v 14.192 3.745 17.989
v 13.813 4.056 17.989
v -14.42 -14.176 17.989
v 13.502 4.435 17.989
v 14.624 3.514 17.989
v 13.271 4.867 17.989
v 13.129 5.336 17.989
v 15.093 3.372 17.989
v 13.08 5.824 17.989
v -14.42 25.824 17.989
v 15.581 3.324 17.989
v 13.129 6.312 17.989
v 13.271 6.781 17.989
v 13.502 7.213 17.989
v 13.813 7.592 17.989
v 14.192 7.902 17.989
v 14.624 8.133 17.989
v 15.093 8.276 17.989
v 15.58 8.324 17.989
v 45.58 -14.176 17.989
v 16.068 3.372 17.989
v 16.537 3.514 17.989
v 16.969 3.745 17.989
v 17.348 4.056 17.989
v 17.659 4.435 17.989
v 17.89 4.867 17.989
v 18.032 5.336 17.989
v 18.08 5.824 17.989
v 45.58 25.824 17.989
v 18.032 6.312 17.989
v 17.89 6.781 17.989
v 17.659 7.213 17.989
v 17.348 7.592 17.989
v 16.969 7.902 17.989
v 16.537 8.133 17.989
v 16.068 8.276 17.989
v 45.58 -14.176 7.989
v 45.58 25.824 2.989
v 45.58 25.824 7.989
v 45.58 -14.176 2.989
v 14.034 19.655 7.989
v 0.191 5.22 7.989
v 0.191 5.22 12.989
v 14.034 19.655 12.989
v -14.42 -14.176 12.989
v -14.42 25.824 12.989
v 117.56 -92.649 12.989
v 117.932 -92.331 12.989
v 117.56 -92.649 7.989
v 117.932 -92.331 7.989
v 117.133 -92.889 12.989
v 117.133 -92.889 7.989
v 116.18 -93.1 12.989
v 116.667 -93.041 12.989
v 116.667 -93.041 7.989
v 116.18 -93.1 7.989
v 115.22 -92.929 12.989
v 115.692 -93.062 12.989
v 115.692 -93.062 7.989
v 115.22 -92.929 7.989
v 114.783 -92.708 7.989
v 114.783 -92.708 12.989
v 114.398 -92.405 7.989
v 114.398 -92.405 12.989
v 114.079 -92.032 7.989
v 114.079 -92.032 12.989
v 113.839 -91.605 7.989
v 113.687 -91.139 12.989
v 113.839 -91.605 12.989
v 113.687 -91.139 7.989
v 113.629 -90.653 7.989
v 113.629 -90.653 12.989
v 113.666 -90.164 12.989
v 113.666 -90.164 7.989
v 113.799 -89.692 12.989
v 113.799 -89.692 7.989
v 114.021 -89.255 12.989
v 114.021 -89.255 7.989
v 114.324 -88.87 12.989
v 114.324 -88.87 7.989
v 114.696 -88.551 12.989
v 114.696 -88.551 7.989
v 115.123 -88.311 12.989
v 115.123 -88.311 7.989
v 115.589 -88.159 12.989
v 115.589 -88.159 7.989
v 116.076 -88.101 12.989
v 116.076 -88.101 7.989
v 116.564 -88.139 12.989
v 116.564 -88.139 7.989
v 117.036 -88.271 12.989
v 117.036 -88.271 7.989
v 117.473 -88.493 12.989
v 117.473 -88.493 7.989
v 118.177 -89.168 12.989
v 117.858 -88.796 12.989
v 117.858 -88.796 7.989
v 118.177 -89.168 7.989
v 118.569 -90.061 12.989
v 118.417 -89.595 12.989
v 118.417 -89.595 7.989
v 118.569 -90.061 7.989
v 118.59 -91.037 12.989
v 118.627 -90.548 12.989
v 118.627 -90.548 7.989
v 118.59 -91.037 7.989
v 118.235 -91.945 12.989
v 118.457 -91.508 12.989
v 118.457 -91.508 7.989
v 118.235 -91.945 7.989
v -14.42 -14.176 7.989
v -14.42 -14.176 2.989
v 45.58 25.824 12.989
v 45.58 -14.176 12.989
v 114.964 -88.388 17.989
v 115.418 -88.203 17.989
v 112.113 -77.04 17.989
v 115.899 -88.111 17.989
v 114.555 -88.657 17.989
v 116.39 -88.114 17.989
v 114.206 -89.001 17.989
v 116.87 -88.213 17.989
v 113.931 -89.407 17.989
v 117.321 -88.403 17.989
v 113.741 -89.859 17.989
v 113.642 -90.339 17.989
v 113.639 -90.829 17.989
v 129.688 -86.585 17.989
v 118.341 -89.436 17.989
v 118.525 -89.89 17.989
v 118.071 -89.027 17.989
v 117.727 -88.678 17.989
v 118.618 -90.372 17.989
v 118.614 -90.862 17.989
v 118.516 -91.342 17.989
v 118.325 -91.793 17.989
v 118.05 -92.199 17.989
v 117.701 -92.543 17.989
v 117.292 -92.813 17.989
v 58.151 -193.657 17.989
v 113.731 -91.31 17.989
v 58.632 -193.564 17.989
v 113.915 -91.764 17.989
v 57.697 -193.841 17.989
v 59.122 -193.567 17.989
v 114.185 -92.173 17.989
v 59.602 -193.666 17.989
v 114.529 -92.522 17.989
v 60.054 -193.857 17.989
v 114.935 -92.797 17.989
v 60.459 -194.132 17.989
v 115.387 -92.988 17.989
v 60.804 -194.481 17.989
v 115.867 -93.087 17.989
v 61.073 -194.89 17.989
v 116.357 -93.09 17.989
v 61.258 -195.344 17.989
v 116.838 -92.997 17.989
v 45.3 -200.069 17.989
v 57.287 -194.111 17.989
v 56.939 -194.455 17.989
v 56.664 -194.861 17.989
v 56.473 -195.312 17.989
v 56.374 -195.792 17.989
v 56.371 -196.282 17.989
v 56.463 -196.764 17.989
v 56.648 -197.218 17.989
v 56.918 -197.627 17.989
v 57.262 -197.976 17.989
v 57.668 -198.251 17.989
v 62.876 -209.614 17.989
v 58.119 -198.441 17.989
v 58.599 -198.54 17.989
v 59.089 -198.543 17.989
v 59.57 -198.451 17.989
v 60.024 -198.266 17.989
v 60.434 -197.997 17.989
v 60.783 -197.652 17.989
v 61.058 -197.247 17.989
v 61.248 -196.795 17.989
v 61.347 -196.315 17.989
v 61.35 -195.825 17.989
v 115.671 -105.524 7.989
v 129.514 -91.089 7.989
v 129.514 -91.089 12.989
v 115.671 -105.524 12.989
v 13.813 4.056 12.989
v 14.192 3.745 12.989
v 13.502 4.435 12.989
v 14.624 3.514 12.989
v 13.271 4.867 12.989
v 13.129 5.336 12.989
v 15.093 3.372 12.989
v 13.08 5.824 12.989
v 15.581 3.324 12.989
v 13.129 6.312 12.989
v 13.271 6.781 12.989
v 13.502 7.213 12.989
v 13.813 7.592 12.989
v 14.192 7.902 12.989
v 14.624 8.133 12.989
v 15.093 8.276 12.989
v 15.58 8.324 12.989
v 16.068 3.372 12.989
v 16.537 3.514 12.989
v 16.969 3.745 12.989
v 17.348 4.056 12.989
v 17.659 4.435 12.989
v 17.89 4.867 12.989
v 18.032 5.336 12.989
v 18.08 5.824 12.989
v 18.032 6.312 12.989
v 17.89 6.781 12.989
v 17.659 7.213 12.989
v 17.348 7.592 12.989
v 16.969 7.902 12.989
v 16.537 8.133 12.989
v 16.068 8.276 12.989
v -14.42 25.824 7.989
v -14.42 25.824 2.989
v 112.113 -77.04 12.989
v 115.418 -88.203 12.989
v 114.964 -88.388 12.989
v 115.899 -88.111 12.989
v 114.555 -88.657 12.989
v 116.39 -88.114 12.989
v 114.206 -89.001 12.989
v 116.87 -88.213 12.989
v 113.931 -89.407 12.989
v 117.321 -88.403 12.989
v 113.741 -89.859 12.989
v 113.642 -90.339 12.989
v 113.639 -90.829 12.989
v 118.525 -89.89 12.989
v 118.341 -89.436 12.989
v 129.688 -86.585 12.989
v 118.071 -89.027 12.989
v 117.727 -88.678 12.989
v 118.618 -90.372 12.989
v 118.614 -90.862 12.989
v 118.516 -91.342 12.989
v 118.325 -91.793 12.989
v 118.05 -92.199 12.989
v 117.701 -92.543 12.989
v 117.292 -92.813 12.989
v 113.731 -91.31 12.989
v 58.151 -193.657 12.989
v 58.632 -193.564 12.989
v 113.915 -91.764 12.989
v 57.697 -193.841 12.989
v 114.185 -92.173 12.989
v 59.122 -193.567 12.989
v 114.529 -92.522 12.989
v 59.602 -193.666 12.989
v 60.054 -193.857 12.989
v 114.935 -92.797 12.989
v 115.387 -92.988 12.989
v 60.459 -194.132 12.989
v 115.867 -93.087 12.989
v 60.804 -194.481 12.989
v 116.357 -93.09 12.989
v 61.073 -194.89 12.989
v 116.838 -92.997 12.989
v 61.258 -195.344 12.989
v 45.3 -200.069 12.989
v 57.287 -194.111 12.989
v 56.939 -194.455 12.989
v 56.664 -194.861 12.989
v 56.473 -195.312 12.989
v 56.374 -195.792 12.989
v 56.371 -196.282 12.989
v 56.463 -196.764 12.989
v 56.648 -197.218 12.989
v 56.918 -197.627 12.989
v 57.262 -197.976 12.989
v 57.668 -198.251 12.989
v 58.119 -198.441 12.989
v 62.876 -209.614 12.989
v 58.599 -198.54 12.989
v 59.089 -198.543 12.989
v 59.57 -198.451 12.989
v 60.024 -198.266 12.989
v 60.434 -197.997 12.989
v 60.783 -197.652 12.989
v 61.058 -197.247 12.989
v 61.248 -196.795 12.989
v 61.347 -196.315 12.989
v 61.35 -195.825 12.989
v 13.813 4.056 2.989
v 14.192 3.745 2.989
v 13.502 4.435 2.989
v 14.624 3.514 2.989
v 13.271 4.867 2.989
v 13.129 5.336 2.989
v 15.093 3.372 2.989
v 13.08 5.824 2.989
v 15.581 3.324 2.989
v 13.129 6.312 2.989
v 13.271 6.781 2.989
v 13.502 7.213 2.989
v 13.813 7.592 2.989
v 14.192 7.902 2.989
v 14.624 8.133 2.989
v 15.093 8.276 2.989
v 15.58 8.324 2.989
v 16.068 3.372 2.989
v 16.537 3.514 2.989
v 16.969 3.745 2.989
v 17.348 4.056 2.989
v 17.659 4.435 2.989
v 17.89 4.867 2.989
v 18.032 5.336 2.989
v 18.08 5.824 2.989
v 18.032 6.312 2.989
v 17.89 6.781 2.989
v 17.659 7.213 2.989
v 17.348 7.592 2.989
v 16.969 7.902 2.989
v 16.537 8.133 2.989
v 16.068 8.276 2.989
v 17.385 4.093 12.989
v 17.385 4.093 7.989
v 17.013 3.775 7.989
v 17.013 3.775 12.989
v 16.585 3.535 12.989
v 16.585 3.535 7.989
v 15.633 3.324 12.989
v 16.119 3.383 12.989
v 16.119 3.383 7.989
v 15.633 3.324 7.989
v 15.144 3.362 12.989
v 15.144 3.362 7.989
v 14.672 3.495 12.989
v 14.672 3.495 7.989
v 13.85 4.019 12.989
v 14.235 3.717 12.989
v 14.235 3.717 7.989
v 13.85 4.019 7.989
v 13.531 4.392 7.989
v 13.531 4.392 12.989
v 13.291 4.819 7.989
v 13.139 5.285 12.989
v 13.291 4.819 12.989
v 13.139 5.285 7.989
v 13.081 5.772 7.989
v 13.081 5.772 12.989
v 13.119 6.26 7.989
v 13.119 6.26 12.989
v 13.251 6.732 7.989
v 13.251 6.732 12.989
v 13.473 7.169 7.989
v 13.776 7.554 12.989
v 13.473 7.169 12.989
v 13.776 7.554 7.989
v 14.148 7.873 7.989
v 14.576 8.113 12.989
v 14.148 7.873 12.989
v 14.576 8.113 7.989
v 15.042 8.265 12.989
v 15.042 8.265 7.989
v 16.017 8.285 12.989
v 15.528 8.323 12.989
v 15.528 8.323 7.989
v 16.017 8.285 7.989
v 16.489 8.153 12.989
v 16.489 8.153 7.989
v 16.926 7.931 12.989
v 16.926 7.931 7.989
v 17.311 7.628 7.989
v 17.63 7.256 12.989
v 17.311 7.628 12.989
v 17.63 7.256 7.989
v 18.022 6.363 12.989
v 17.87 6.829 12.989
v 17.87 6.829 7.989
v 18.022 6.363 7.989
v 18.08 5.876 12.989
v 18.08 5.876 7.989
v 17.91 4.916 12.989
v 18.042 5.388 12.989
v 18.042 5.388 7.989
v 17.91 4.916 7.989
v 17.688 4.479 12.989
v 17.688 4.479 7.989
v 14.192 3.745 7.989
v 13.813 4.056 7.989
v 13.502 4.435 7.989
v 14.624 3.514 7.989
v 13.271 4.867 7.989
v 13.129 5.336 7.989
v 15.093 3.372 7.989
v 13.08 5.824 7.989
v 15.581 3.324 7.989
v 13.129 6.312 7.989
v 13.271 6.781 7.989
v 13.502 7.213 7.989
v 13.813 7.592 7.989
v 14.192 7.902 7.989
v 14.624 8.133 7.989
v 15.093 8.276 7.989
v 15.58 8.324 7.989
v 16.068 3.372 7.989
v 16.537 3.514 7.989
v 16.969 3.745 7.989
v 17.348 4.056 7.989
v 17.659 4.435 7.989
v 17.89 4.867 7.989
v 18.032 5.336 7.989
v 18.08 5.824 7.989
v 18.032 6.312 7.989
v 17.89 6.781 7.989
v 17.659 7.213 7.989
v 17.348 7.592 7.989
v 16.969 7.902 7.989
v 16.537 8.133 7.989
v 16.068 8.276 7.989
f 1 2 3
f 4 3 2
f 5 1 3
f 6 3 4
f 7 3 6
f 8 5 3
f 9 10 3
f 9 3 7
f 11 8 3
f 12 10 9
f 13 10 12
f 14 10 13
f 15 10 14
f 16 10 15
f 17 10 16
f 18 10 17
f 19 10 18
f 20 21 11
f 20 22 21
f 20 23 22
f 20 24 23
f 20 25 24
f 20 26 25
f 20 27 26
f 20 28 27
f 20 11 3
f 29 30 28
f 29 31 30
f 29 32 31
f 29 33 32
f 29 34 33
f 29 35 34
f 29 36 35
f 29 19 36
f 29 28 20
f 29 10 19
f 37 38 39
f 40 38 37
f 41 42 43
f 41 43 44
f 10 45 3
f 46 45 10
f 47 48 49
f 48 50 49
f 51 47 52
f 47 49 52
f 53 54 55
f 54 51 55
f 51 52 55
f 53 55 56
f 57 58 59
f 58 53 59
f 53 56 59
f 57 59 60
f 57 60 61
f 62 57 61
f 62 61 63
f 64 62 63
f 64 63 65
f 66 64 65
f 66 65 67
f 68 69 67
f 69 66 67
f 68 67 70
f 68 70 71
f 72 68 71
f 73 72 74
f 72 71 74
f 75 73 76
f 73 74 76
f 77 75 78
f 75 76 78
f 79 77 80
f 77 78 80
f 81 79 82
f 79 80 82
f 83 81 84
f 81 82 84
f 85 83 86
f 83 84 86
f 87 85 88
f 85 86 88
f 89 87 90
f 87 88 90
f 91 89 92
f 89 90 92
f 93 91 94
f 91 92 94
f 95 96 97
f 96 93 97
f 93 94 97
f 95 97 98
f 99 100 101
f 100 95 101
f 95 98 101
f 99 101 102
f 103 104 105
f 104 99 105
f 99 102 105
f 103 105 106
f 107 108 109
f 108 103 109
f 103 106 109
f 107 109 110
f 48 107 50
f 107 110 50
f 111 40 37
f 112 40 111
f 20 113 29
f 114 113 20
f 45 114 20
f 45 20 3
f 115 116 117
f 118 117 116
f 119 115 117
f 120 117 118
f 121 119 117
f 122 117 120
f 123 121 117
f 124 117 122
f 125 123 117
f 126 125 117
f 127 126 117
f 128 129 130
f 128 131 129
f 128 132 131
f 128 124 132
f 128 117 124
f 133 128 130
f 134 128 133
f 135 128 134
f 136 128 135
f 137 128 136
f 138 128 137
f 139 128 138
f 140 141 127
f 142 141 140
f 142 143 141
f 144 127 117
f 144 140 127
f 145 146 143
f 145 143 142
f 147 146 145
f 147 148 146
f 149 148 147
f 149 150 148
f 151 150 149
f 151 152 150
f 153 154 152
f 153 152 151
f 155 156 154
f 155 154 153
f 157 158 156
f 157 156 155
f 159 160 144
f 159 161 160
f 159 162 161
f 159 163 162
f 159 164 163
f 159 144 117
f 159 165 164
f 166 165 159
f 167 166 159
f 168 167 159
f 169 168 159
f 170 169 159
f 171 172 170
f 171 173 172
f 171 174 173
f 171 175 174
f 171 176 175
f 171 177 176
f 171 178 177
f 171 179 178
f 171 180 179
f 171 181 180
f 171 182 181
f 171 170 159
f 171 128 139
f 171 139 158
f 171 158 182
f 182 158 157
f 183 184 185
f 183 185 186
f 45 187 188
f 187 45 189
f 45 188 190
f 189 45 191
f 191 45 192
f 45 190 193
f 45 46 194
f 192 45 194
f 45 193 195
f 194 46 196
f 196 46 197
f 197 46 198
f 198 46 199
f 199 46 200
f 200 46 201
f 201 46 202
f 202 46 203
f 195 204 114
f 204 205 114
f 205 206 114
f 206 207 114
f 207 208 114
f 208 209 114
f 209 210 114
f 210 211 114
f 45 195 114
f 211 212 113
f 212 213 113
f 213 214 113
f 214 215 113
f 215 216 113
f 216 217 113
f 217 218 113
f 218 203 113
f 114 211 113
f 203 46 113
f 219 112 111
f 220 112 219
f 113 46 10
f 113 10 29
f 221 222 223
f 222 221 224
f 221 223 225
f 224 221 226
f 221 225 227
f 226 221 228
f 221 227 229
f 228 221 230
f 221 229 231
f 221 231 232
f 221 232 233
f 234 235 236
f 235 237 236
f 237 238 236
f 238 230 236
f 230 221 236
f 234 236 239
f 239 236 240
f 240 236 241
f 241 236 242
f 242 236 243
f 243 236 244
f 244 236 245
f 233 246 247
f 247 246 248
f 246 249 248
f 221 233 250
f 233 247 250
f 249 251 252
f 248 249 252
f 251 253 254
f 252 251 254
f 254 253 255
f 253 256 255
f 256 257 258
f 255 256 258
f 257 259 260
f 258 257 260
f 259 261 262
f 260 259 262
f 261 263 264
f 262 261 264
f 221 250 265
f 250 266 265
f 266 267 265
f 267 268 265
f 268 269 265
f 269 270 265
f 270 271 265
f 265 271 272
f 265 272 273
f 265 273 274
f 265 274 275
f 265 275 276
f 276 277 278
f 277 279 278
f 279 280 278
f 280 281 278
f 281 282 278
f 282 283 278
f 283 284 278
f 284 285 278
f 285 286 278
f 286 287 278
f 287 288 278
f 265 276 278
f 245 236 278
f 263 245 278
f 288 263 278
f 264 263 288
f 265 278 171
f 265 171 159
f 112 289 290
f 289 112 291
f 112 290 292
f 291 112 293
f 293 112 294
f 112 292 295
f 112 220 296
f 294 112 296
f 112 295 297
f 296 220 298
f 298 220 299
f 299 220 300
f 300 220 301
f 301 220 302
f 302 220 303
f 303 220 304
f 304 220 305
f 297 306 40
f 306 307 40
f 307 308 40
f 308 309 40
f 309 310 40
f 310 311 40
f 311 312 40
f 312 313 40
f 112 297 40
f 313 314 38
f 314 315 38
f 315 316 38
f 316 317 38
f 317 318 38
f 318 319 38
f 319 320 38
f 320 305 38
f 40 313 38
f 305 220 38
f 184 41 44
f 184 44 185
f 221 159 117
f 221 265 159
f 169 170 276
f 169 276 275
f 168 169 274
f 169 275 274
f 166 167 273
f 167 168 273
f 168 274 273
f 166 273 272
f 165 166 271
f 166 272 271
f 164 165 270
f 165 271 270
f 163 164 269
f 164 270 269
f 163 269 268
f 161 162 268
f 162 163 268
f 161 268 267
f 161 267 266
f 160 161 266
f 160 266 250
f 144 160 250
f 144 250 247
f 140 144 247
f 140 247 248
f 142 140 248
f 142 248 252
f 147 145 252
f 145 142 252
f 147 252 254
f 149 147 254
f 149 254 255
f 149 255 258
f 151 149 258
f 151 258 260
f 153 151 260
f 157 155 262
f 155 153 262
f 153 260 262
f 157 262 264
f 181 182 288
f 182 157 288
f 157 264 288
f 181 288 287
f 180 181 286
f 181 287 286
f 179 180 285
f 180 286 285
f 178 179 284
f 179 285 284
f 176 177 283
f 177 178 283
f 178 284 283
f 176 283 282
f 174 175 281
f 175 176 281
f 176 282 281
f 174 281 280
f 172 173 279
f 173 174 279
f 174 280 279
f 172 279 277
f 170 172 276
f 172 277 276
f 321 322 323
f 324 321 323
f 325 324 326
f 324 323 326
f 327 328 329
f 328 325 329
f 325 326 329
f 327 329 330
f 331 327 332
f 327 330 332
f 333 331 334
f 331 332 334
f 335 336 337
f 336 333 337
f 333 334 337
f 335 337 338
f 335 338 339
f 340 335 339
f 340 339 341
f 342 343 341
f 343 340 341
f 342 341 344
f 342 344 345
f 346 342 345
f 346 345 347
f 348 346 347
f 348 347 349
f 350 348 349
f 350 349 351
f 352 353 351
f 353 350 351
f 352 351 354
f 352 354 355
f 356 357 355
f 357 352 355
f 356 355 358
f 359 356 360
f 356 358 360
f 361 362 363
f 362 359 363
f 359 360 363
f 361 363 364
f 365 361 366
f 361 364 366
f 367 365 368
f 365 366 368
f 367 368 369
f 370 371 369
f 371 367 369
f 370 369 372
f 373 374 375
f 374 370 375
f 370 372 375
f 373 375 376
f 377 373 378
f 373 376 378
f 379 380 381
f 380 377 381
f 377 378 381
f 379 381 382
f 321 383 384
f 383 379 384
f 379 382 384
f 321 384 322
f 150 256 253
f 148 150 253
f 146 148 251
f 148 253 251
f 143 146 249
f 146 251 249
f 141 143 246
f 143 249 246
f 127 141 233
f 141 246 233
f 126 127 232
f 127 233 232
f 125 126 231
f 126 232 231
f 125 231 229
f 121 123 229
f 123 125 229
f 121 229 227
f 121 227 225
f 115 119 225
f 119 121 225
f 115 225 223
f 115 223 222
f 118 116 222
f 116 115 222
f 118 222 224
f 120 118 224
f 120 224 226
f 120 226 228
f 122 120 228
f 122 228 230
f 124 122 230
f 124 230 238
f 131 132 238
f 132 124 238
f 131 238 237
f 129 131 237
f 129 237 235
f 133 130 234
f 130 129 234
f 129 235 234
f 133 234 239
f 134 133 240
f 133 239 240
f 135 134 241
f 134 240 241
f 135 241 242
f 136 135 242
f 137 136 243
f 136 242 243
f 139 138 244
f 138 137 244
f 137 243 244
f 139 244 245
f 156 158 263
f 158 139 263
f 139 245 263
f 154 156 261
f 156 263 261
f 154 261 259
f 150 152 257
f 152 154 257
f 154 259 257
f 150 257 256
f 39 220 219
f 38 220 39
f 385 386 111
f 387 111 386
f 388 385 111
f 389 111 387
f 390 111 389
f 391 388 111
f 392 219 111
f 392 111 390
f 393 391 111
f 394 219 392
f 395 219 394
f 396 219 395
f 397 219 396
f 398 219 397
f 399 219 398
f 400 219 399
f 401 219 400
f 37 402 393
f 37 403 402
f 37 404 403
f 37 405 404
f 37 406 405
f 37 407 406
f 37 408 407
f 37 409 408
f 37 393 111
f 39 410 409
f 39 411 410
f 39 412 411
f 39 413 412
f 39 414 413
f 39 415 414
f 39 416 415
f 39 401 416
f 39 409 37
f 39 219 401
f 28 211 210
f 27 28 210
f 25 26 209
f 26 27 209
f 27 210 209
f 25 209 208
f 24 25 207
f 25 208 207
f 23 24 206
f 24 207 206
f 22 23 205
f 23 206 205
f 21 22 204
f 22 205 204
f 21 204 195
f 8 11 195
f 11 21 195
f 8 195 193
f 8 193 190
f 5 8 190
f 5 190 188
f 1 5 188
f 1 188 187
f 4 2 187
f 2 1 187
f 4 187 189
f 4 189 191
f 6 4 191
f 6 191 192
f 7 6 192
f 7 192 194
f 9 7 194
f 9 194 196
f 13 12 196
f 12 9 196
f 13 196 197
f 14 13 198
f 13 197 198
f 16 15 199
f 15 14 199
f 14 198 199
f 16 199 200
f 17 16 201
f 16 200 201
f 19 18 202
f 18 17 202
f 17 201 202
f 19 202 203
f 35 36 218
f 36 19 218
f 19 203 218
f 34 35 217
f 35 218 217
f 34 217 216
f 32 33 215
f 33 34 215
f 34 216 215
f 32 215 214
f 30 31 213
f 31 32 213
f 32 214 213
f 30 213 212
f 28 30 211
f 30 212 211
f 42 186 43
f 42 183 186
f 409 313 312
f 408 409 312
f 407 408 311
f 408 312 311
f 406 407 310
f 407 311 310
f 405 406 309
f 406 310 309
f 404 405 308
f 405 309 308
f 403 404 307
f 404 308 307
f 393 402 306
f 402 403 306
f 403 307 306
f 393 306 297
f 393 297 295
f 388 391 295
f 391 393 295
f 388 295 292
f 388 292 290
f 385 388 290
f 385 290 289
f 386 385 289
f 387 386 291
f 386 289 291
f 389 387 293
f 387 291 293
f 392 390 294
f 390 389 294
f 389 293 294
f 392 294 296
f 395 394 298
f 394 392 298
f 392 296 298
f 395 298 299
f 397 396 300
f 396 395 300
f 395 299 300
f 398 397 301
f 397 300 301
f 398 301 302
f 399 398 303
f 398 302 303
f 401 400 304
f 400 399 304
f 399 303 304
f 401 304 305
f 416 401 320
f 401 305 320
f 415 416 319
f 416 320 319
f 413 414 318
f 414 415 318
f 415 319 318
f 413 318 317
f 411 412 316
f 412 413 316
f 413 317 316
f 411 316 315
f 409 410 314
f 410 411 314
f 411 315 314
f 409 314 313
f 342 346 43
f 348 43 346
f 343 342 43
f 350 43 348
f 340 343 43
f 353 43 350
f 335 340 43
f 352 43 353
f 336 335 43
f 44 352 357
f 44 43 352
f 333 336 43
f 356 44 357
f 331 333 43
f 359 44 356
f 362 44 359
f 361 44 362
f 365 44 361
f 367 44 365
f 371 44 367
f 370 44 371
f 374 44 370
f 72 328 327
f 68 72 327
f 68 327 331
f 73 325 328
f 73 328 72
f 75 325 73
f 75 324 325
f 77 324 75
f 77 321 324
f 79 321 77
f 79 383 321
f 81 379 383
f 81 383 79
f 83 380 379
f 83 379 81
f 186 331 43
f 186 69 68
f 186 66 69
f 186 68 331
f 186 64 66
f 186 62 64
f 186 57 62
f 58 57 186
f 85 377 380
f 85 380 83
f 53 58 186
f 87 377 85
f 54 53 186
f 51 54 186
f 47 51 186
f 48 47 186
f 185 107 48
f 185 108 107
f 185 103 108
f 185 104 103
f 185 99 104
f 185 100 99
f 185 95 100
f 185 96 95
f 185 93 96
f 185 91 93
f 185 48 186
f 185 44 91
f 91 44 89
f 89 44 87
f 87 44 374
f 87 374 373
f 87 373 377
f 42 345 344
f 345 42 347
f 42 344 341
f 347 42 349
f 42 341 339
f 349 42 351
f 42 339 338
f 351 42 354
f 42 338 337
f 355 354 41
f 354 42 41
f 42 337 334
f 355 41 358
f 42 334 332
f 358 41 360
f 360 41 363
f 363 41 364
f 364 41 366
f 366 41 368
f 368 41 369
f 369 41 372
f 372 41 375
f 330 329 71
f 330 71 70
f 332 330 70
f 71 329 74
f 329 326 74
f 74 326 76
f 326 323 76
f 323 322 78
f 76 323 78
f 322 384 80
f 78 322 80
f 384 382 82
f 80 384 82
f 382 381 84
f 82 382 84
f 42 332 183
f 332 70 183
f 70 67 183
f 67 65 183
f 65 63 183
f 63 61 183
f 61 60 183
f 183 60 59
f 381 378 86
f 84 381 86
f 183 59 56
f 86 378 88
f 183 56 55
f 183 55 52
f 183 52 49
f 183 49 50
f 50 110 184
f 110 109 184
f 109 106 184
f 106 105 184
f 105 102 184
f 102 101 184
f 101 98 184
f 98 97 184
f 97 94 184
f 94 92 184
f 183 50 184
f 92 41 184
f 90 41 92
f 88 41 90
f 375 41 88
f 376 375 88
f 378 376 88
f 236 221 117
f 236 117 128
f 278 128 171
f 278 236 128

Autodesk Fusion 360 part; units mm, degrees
sketch "草图1" plane through (0, 0, 0) normal (0, 0, 1) x (1, 0, 0)
  line L0 (30, 20) -> (-30, 20)
  line L1 (-30, 20) -> (-30, -20)
  line L2 (-30, -20) -> (30, -20)
  line L3 (30, -20) -> (30, 20)
  line L4 (30, 20) -> (-30, -20) construction
  line L5 (-30, 20) -> (30, -20) construction
  circle A0 centre (0, 0) radius 2.5
  dimension "d1" = 5
sketch "草图3" plane through (0, 0, 0) normal (0, 0, 1) x (1, 0, 0)
  line L0 (59.3105, 8.9123) -> (219.3105, 8.9123)
  line L1 (219.3105, 8.9123) -> (219.3105, -11.0877)
  line L2 (219.3105, -11.0877) -> (59.3105, -11.0877)
  line L3 (59.3105, -11.0877) -> (59.3105, 8.9123)
  circle A0 centre (70, 0) radius 2.5
  circle A1 centre (209.3105, 0) radius 2.5
  dimension "d6" = 160
  dimension "d7" = 20
  dimension "d8" = 5
  dimension "d10" = 5
extrude "拉伸3" add sketch "草图3" along normal blind 5 makes body 1
sketch "草图4" plane through (0, 0, 0) normal (0, 0, 1) x (1, 0, 0)
  line L0 (-33, -75) -> (107, -75)
  line L1 (107, -75) -> (107, -95)
  line L2 (107, -95) -> (-33, -95)
  line L3 (-33, -95) -> (-33, -75)
  circle A0 centre (-23, -85) radius 2.5
  circle A1 centre (97, -85) radius 2.5
  dimension "d13" = 140
  dimension "d14" = 20
  dimension "d15" = 5
  dimension "d16" = 5
extrude "拉伸4" add sketch "草图4" along normal blind 5 separate body makes body 2
sketch "草图5" plane through (0, 0, 0) normal (0, 0, 1) x (1, 0, 0)
  line L0 (-30, 20) -> (30, 20)
  line L1 (30, 20) -> (30, -20)
  line L2 (30, -20) -> (-30, -20)
  line L3 (-30, -20) -> (-30, 20)
  line L4 (-30, 20) -> (30, -20) construction
  line L5 (30, 20) -> (-30, -20) construction
  circle A0 centre (0, 0) radius 2.5
  dimension "d19" = 60
  dimension "d20" = 40
  dimension "d21" = 5
extrude "拉伸5" add sketch "草图5" along normal blind 5 separate body makes body 3
sketch "草图6" plane through (0, 0, 0) normal (0, 0, 1) x (1, 0, 0)
  circle A0 centre (76.9556, 57.3858) radius 2.5
  dimension "d24" = 5
copy_body "实体->零部件1" bodies 3 removing the originals makes body 4 in component "Base"
copy_body "实体->零部件2" bodies 1 removing the originals makes body 5 in component "Link 1"
copy_body "实体->零部件3" bodies 2 removing the originals makes body 6 in component "Link 2"
component "Base" placed x (1, 0, 0) y (0, 1, 0) z (0, 0, 1) at (15.5805, 5.8238, 2.9887)
component "Link 1" placed x (0.721751, -0.692152, 0) y (0.692152, 0.721751, 0) z (0, 0, 1) at (-34.9421, 54.2745, 7.9887)
component "Link 2" placed x (-0.477229, -0.878779, 0) y (0.878779, -0.477229, 0) z (0, 0, 1) at (179.848, -151.3766, 12.9887)
component "Base" placed x (1, 0, 0) y (0, 1, 0) z (0, 0, 1) at (15.5805, 5.8238, 12.9887)
